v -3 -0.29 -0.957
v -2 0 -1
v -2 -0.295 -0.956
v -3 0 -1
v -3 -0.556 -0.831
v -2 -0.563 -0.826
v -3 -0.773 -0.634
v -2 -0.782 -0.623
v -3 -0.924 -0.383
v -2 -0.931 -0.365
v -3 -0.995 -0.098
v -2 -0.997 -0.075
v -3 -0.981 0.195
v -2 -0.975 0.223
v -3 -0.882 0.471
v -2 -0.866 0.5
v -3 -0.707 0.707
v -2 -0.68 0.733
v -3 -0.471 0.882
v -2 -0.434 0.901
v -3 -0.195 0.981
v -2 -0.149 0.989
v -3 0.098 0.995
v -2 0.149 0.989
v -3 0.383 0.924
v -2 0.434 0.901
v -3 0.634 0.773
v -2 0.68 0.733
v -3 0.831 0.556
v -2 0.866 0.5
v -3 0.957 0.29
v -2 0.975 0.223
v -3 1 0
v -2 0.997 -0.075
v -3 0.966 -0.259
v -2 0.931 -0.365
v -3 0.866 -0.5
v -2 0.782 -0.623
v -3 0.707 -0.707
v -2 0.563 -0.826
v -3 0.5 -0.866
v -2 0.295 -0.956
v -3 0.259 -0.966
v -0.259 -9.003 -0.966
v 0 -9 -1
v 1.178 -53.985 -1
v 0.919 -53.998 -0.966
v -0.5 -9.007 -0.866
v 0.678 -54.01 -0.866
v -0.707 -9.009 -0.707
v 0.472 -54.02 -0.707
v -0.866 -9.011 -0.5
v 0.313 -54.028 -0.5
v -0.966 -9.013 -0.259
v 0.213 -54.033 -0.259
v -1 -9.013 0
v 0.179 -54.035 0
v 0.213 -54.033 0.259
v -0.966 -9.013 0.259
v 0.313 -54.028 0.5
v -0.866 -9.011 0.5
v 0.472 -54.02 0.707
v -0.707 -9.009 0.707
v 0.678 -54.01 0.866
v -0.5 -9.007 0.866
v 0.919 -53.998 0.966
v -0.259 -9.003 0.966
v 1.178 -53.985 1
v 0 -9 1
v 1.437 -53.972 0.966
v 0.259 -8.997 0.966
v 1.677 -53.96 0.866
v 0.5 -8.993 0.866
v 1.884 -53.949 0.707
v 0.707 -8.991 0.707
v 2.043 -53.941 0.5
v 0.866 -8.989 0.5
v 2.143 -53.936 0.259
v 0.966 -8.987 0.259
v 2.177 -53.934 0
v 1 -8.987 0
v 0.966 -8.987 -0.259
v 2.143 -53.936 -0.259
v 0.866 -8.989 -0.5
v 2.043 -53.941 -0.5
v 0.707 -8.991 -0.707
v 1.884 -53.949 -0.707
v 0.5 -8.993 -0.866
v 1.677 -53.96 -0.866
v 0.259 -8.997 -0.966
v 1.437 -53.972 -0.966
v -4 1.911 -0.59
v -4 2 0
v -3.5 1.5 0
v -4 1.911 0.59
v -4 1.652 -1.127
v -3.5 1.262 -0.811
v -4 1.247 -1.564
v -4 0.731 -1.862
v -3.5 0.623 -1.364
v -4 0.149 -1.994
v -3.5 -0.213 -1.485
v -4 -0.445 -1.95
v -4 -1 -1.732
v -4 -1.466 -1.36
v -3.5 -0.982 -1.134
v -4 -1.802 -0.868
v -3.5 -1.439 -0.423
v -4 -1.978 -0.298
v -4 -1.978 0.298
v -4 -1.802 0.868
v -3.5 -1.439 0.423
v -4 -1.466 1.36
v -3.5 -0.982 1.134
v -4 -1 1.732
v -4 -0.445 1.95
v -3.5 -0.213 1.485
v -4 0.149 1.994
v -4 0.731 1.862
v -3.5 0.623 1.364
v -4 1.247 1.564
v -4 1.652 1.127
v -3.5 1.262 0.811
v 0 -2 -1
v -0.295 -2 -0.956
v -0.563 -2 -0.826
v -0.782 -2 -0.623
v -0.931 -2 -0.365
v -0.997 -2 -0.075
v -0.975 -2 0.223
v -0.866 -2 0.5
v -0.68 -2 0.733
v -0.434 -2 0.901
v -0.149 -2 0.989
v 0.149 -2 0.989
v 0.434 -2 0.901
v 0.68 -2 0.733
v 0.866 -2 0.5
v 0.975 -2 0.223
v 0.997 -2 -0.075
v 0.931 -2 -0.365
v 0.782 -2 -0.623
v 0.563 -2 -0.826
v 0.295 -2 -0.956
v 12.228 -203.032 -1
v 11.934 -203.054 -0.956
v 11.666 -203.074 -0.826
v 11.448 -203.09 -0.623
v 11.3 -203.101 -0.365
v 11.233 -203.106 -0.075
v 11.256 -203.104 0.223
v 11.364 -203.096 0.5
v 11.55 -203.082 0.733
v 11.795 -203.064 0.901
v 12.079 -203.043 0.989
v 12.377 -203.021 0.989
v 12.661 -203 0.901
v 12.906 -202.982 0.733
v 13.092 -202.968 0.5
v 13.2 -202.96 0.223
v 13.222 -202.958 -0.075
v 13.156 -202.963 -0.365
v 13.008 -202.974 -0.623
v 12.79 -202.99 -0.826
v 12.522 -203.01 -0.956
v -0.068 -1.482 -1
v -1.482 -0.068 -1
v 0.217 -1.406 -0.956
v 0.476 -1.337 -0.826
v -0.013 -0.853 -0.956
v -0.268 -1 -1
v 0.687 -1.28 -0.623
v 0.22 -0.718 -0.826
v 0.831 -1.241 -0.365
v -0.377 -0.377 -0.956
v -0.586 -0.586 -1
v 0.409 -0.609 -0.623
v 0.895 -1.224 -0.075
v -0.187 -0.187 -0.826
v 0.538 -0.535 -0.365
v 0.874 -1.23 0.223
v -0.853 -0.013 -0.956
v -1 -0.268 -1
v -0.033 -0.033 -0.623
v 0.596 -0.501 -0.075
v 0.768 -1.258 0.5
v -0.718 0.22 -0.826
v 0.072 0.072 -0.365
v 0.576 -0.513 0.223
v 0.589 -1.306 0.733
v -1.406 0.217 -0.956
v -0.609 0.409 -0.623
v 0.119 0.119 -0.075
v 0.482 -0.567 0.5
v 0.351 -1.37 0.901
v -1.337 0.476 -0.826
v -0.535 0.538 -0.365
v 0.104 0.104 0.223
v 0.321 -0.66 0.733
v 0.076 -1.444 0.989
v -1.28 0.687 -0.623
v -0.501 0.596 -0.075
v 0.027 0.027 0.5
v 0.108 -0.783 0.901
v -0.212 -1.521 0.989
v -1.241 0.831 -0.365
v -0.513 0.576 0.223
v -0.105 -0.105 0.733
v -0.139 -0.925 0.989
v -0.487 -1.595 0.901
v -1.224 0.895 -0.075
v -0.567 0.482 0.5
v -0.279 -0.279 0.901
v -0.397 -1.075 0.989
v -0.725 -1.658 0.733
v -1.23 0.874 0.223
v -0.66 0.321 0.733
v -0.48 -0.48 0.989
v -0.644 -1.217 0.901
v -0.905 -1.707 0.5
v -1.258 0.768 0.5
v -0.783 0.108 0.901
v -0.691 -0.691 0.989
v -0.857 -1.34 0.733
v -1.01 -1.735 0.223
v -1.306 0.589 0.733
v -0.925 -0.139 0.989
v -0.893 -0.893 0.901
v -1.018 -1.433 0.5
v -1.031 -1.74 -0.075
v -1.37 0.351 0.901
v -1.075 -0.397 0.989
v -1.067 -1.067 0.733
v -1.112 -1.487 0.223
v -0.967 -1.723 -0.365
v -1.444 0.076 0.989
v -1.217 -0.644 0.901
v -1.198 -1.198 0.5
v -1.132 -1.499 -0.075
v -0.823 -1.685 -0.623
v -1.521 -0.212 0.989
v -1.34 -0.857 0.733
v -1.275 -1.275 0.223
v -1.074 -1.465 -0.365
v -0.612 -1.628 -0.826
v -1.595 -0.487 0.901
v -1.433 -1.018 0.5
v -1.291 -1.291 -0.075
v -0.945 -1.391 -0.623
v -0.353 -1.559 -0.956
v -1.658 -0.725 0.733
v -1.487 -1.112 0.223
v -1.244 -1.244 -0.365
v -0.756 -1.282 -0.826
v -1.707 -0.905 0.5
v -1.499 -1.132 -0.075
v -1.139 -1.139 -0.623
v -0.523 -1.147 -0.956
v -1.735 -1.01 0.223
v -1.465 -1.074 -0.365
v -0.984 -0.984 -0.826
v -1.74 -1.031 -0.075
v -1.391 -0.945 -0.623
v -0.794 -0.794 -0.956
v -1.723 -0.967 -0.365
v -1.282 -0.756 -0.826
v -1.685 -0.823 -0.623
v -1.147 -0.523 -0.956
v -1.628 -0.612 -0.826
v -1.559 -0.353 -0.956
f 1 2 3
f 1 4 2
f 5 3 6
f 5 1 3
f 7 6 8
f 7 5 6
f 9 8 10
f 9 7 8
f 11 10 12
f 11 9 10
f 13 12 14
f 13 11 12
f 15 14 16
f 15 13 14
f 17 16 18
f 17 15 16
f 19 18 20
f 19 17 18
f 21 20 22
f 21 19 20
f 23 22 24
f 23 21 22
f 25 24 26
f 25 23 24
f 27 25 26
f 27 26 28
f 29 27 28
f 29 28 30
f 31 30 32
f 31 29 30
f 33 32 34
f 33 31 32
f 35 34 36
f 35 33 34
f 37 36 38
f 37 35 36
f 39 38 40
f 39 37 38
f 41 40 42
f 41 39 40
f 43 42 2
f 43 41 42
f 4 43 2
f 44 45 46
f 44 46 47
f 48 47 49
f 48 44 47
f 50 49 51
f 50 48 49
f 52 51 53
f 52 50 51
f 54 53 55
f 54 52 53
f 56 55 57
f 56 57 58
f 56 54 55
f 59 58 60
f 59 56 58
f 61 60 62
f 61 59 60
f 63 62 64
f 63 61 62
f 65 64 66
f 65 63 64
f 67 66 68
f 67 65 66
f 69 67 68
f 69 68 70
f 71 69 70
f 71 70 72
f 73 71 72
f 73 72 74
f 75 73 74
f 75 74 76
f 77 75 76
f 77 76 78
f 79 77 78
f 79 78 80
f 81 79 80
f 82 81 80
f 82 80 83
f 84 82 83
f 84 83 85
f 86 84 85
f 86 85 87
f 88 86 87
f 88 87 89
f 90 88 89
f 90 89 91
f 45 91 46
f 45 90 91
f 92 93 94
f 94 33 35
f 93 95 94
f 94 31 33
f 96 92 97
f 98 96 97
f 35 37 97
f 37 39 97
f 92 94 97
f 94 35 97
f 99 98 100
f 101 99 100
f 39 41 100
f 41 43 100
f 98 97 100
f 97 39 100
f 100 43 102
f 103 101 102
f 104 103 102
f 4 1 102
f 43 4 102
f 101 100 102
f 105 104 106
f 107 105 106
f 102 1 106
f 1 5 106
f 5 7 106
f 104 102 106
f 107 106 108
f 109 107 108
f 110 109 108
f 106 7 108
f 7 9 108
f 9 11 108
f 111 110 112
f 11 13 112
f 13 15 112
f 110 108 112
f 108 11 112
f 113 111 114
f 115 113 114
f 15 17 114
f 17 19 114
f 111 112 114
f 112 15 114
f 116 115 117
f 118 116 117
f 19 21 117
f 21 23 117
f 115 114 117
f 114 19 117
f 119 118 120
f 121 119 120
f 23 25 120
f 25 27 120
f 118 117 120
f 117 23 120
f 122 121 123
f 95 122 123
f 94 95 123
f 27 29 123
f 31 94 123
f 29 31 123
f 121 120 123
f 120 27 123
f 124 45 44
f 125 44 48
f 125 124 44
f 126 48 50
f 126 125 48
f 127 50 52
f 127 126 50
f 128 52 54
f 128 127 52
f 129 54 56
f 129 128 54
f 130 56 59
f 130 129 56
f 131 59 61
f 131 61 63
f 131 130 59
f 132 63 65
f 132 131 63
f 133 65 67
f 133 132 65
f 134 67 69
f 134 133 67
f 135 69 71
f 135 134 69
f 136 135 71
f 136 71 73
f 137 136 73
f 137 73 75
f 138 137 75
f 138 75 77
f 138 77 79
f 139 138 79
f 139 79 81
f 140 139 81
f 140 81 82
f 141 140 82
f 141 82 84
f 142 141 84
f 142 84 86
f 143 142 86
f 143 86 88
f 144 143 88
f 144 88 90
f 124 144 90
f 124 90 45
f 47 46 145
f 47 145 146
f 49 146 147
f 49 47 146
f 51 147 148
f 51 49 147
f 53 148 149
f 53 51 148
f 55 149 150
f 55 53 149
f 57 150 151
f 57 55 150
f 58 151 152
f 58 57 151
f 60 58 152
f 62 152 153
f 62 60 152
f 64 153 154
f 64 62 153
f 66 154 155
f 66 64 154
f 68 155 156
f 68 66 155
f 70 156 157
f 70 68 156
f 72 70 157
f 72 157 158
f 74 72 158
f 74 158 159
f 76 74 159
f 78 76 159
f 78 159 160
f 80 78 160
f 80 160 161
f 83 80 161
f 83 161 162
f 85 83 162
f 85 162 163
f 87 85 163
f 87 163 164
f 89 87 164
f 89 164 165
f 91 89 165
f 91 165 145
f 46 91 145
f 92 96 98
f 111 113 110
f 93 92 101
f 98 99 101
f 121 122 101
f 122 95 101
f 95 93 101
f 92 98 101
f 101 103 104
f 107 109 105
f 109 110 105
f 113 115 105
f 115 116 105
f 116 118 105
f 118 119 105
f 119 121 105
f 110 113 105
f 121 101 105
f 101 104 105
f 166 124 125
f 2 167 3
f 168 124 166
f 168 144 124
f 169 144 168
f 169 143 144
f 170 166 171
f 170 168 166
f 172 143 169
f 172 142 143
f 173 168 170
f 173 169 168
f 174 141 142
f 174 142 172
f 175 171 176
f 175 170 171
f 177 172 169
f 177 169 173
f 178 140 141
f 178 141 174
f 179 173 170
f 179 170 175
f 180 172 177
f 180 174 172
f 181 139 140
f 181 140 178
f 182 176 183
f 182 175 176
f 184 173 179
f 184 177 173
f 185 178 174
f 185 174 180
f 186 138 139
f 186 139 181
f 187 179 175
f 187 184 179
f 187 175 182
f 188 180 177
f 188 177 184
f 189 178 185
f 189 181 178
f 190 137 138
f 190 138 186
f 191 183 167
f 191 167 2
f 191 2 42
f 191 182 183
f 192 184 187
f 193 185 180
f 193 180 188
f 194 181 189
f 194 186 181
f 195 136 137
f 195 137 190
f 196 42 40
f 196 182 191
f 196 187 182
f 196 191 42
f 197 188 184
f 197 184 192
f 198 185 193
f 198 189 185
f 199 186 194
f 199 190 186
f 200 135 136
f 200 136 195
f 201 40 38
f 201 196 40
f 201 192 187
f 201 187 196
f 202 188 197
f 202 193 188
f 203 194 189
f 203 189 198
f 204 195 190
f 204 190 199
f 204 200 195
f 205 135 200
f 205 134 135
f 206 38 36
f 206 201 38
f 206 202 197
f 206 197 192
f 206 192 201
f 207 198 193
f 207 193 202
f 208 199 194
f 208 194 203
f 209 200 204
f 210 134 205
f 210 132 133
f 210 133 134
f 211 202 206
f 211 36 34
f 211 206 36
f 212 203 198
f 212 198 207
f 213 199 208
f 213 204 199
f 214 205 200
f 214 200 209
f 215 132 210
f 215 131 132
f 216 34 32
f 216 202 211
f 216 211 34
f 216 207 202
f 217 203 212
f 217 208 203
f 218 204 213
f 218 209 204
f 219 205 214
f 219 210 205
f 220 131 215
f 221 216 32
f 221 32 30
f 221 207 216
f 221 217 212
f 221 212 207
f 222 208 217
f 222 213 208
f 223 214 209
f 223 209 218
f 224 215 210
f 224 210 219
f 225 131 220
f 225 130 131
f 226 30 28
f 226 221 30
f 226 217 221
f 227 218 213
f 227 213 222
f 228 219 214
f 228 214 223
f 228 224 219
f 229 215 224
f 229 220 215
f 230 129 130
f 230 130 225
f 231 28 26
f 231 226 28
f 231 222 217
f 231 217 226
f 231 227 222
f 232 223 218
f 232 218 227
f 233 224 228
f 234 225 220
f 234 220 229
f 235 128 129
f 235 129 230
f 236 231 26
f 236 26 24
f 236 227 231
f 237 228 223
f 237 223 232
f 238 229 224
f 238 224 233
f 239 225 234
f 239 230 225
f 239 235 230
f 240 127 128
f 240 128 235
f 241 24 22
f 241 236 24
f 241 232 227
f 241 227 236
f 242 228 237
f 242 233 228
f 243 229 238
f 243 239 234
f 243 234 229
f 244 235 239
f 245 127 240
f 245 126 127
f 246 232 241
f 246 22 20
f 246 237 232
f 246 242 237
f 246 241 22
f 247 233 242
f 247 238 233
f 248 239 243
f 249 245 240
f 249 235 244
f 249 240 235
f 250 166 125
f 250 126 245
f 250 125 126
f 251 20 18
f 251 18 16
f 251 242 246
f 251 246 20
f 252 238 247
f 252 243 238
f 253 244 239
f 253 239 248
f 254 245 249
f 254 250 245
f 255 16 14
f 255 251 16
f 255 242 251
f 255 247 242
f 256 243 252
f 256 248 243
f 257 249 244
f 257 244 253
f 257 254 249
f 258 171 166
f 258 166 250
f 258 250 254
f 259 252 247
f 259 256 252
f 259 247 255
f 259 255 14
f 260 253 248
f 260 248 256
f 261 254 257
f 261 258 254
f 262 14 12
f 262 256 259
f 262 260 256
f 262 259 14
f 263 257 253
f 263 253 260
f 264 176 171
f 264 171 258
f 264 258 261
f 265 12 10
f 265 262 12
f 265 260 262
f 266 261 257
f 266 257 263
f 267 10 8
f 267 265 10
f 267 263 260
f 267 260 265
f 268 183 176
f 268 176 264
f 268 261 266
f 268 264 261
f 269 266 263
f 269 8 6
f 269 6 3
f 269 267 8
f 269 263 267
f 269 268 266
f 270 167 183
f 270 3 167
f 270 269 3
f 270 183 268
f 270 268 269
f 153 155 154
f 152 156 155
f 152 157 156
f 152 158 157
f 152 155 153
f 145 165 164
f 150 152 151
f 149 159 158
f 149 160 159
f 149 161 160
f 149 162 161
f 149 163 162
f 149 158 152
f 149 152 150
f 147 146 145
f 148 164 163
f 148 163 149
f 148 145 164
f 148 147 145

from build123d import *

# Parameters (mm, degrees)
ESQUISSE2_R = 1


with BuildPart() as part:
    # Balayage1: sweep along a path in Esquisse1
    with BuildLine(Plane.XY) as balayage1_path:
        Line((12.227962674, -203.032108123), (1.177962674, -53.984579624))
        Line((1.177962674, -53.984579624), (0, -9))
        Line((0, -9), (0, -2))
        ThreePointArc((0, -2), (-0.585786438, -0.585786438), (-2, 0))
        Line((-2, 0), (-4, 0))
    # Esquisse2 → Balayage1 (sweep)
    with BuildSketch(Plane(origin=(-4, 0, 0), x_dir=(0, 0, -1), z_dir=(1, 0, 0))):
        Circle(ESQUISSE2_R)
    sweep(path=balayage1_path.line, transition=Transition.RIGHT)

    # Esquisse3 → Révolution1 (revolve)
    with BuildSketch(Plane.XY):
        Polygon((-4, 1), (-4, 2), (-3, 1), align=None)
    revolve(axis=Axis((0, 0, 0), (-1, 0, 0)))


solid = part.part
